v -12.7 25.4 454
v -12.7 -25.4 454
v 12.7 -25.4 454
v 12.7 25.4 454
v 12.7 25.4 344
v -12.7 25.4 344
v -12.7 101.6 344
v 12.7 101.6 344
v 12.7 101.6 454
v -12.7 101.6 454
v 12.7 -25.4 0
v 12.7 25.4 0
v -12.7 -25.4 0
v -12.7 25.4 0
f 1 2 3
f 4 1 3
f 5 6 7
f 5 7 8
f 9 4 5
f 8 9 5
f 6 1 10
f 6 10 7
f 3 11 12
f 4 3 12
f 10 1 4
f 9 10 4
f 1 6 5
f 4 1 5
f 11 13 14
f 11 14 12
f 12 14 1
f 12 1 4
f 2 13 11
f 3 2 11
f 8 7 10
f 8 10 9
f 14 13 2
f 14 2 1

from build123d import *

# Parameters (mm, degrees)
SKETCH1_W           = 25.4
SKETCH1_H           = 50.8
BOSS_EXTRUDE1_DEPTH = 454
SKETCH2_W           = 25.4
SKETCH2_H           = 110
BOSS_EXTRUDE2_DEPTH = 76.2


with BuildPart() as part:
    # Sketch1 → Boss-Extrude1 (new body)
    with BuildSketch(Plane.XY):
        Rectangle(SKETCH1_W, SKETCH1_H)
    extrude(amount=BOSS_EXTRUDE1_DEPTH)


with BuildPart() as body_2:
    # Sketch2 → Boss-Extrude2 (new body)
    with BuildSketch(Plane(origin=(0, 25.4, 0), x_dir=(1, 0, 0), z_dir=(0, 1, 0))):
        with Locations((0, -399)):
            Rectangle(SKETCH2_W, SKETCH2_H)
    extrude(amount=BOSS_EXTRUDE2_DEPTH)


solid = Compound([part.part, body_2.part])
